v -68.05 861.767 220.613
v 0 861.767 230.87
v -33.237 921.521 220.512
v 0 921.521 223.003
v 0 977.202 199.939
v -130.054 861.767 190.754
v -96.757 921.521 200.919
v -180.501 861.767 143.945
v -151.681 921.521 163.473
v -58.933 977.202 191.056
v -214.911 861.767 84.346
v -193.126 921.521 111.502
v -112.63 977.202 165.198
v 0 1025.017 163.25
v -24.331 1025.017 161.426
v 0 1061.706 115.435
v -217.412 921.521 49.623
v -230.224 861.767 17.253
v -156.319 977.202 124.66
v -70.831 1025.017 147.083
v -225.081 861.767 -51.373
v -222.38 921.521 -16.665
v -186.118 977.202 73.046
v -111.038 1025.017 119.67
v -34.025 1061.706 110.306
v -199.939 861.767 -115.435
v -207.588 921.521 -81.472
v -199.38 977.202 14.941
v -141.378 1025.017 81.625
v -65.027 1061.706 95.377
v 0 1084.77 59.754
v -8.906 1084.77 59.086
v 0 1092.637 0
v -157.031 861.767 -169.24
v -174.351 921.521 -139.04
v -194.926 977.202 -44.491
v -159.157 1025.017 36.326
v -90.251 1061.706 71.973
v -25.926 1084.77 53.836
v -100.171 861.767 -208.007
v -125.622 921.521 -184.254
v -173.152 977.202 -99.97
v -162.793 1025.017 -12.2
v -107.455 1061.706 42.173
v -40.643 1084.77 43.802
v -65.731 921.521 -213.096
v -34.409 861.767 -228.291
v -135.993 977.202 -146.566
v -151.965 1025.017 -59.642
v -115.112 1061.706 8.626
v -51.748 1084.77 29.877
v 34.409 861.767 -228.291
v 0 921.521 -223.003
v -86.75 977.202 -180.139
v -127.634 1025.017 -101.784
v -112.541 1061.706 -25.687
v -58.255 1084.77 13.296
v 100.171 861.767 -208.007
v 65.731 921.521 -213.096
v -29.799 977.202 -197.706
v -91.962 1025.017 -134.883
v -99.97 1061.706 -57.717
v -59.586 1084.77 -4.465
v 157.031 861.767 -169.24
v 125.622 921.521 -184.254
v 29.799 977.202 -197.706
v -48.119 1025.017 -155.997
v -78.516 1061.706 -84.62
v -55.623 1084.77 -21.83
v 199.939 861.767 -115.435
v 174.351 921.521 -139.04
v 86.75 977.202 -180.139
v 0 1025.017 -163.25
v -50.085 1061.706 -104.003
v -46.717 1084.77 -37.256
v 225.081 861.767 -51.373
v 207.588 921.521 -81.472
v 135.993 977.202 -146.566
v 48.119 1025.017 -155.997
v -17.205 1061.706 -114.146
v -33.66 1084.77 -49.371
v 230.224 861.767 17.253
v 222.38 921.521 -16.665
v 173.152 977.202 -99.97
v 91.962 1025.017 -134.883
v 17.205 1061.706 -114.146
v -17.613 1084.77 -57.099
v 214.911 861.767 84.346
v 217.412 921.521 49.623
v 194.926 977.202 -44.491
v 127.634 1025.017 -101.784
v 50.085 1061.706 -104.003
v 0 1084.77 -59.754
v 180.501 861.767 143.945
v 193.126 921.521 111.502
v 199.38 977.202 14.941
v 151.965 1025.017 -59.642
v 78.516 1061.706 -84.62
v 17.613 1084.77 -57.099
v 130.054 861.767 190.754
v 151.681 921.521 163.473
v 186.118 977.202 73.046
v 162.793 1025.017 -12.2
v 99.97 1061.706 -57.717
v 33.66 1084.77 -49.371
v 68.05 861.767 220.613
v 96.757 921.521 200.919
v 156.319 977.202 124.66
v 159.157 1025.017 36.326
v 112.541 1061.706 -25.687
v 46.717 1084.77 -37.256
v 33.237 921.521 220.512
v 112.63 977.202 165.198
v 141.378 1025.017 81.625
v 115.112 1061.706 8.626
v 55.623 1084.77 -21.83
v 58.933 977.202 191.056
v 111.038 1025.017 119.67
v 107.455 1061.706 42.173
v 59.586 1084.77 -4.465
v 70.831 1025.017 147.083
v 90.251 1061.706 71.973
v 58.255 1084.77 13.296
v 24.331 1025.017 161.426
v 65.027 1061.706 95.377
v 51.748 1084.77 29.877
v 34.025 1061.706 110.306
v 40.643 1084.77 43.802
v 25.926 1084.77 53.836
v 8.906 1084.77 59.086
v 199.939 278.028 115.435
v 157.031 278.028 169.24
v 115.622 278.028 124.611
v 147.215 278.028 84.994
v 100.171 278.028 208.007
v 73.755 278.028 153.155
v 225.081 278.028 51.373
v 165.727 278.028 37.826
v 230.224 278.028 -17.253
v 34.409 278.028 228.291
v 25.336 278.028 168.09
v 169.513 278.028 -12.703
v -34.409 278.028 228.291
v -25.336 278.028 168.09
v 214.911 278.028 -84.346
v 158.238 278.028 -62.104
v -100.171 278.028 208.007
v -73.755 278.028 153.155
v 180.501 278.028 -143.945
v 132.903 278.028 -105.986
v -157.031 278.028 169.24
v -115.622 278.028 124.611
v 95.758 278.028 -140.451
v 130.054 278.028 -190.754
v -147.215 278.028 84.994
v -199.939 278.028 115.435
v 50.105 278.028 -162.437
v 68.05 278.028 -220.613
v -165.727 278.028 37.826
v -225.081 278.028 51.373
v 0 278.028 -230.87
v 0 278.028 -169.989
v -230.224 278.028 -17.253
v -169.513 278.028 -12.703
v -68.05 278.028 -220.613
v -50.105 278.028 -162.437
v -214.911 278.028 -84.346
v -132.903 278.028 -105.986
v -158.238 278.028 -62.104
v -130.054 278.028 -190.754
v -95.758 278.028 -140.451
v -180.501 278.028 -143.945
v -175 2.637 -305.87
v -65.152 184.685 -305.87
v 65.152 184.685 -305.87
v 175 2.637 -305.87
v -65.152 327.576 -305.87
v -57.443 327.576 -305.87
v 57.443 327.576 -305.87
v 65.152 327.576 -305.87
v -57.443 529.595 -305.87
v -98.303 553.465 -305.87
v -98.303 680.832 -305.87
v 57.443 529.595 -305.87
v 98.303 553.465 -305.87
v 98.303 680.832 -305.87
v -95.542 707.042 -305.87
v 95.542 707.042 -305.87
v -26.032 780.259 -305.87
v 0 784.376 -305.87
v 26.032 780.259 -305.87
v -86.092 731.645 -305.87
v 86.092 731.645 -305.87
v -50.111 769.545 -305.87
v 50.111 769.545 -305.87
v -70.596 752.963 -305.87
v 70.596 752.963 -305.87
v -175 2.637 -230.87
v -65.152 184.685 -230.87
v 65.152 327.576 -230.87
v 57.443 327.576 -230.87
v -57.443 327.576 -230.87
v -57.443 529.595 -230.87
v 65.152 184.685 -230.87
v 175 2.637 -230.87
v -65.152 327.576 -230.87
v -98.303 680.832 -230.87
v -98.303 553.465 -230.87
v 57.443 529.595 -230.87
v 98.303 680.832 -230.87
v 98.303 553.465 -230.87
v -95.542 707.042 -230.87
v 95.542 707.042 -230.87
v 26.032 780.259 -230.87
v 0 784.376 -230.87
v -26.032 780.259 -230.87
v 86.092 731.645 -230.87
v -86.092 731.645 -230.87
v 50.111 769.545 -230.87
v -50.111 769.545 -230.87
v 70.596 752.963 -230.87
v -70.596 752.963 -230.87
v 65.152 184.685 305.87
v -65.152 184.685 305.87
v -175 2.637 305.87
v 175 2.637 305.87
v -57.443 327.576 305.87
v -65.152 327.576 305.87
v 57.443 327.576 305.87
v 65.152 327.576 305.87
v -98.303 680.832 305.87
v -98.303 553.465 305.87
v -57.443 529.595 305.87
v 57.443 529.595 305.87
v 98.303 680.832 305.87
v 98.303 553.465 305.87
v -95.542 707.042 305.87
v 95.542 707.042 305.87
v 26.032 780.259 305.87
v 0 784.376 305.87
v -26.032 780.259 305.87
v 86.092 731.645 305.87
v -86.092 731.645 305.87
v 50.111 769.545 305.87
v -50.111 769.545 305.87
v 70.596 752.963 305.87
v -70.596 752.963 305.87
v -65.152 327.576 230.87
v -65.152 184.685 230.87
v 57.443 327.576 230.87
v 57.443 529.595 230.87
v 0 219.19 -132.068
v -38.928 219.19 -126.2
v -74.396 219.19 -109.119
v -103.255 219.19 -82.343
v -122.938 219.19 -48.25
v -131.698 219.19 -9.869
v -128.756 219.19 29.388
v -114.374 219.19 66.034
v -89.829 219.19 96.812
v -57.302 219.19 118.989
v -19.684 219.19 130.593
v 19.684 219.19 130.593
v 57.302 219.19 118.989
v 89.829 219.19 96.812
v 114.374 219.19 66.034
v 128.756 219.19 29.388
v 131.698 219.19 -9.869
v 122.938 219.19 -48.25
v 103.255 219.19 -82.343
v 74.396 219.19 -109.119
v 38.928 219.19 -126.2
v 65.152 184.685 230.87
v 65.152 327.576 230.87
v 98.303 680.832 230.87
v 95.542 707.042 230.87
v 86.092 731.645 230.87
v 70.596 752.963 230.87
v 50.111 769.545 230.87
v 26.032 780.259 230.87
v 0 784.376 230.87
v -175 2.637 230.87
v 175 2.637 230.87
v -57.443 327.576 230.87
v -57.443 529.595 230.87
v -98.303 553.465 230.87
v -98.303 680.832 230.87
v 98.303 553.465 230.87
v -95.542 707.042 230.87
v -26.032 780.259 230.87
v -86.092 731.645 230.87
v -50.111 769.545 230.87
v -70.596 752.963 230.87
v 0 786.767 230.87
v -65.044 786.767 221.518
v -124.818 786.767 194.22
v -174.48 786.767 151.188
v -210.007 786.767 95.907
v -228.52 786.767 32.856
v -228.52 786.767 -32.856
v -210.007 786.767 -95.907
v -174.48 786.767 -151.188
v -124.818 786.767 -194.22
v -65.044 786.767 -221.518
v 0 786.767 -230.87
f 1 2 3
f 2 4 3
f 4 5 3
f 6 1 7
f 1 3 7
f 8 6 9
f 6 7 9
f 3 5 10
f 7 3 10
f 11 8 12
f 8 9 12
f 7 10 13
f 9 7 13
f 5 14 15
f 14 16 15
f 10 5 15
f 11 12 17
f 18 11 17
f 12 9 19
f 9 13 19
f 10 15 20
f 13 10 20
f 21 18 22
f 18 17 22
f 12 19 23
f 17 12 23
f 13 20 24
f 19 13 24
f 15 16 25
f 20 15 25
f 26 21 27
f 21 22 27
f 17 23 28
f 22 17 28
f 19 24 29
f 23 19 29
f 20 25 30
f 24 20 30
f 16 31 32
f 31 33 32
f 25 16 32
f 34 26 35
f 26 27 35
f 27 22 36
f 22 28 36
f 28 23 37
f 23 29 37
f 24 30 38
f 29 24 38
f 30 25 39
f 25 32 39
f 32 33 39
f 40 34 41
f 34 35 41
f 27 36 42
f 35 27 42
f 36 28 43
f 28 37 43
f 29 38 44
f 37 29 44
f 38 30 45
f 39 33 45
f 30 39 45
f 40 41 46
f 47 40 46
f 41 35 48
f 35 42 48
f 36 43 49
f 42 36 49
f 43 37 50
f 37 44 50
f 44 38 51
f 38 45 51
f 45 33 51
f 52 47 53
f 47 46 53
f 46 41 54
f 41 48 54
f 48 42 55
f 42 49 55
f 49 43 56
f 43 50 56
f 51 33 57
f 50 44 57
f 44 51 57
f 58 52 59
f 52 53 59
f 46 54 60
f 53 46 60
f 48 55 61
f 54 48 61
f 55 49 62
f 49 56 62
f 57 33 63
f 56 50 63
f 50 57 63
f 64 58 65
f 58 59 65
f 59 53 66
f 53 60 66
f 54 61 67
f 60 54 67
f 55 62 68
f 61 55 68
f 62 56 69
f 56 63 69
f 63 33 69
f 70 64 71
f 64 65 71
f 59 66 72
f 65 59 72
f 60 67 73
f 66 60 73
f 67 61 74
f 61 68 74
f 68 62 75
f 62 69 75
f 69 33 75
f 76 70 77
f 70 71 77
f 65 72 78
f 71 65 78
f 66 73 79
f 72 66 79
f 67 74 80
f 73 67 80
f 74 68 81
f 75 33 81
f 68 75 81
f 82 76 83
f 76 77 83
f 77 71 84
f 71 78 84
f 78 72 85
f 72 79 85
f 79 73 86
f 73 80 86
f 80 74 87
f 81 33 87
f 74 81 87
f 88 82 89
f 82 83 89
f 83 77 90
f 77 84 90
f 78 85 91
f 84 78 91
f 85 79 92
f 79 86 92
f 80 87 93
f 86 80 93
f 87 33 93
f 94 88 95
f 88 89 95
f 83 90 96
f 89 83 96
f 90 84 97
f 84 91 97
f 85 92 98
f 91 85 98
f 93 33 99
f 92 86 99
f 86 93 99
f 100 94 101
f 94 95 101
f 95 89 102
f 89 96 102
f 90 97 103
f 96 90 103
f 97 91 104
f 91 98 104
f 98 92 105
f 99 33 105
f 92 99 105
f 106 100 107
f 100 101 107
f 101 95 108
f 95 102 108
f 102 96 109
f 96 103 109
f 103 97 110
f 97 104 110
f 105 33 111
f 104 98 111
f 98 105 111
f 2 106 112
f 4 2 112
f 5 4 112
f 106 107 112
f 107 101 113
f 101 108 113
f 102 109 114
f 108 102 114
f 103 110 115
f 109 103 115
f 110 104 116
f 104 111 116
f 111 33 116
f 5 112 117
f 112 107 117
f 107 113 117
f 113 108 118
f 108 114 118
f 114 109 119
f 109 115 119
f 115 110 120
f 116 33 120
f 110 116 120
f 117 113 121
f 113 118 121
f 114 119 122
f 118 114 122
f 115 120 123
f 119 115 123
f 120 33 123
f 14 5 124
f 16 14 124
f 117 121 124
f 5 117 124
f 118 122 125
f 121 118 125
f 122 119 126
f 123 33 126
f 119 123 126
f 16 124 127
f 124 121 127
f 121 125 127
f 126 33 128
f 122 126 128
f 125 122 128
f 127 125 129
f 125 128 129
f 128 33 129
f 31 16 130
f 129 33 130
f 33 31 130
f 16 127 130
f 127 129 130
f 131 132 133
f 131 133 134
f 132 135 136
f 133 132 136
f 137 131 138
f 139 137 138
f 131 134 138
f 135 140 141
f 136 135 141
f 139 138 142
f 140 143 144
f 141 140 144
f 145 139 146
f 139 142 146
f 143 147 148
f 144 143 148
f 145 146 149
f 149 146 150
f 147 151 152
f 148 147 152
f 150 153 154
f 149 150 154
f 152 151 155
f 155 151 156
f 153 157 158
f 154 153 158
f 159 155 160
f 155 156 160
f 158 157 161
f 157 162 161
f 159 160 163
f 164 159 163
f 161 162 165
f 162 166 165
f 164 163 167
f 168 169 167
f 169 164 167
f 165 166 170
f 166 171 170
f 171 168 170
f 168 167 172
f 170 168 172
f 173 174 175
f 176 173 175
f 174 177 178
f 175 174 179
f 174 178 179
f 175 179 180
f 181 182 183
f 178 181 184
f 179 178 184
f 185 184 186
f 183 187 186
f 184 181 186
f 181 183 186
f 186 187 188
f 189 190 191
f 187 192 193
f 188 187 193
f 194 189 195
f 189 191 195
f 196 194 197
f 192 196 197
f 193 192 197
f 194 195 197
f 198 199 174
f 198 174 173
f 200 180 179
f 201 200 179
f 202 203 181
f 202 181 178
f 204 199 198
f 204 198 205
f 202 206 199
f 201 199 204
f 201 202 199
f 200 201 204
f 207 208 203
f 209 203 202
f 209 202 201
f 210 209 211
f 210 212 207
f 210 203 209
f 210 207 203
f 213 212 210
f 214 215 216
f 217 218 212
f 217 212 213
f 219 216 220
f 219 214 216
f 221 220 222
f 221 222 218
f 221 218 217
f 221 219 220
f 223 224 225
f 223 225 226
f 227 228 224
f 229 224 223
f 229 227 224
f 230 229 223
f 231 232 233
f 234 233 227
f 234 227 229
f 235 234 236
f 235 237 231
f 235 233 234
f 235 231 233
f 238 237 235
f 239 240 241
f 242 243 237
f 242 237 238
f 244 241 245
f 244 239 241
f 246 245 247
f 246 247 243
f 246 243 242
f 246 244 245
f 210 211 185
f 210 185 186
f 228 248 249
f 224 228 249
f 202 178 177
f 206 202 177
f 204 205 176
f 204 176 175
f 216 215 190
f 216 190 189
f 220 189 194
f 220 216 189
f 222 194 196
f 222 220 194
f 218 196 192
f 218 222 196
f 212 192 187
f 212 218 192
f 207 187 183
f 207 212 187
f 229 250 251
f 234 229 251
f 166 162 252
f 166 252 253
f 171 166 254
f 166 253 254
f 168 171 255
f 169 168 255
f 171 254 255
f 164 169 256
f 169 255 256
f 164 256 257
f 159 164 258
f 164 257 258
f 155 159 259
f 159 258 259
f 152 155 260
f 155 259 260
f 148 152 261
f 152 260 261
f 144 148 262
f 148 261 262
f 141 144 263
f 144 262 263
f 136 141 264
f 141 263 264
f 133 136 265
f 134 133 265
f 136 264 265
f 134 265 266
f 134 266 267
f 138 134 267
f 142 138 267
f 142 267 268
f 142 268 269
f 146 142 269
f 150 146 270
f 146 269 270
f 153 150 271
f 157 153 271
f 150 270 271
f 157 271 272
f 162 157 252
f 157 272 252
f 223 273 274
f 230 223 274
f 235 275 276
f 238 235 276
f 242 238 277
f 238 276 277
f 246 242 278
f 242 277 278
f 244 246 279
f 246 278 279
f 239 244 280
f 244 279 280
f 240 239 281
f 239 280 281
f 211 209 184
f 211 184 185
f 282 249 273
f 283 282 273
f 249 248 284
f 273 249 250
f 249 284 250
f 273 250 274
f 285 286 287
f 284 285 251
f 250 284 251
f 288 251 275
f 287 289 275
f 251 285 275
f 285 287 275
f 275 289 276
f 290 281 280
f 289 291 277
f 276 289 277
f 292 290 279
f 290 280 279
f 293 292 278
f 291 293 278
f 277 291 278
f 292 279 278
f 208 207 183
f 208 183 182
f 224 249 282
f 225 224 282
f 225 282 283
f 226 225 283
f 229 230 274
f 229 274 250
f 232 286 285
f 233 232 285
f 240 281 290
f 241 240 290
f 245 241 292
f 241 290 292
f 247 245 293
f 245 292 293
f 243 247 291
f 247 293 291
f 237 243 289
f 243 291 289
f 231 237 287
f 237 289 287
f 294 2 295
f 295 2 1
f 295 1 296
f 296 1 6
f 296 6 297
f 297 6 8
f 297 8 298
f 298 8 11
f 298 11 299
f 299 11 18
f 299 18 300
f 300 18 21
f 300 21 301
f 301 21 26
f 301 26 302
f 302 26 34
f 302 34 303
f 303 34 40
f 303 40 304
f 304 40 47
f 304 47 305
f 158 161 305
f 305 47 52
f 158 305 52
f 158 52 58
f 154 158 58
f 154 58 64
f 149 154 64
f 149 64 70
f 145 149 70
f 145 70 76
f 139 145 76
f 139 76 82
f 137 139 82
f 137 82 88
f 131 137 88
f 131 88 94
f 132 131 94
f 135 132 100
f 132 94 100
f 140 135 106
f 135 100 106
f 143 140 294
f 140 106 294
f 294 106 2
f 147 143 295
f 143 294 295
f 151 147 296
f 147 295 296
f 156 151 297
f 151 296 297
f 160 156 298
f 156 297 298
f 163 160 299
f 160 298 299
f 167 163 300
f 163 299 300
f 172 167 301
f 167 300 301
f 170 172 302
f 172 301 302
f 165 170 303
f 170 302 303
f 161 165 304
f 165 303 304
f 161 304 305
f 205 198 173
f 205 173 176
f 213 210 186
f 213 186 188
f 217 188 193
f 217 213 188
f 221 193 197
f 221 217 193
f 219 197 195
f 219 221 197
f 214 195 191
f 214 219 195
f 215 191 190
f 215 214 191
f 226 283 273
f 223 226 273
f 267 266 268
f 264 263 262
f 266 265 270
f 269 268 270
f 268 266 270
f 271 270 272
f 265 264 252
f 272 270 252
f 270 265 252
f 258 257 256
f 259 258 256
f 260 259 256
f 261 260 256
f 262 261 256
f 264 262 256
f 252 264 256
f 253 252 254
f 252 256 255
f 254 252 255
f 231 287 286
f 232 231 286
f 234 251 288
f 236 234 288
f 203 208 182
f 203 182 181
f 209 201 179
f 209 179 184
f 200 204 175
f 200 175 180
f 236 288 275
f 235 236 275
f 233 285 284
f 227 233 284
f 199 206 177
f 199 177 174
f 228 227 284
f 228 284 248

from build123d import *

# Parameters (mm, degrees)
BOSS_EXTRUDE1_DEPTH = 75


with BuildPart() as part:
    # Sketch1 → Revolve1 (revolve)
    with BuildSketch(Plane(origin=(0, 0, 0), x_dir=(0, 0, -1), z_dir=(1, 0, 0))):
        Polygon((0, 786.767092044), (230.869874895, 786.767092044), (230.869874895, 278.028274446), (169.988720126, 278.028274446), (132.067656697, 219.189571635), (0, 219.189571635), align=None)
    revolve(axis=Axis((0, 219.189571635, 0), (0, 1, 0)))

    # Sketch2 → Revolve3 (revolve)
    with BuildSketch(Plane(origin=(0, 0, 0), x_dir=(0, 0, -1), z_dir=(1, 0, 0))):
        with BuildLine():
            ThreePointArc((-230.869874895, 861.767092044), (-163.24965411, 1025.016746154), (0, 1092.636966939))
            Line((0, 1092.636966939), (0, 786.767092044))
            Line((0, 786.767092044), (-230.869874895, 786.767092044))
            Line((-230.869874895, 786.767092044), (-230.869874895, 861.767092044))
        make_face()
    revolve(axis=Axis((0, 786.767092044, 0), (0, -1, 0)))


with BuildPart() as body_2:
    # Sketch7 → Boss-Extrude1 (new body)
    with BuildSketch(Plane(origin=(0, 0, -230.869874895), x_dir=(-1, 0, 0), z_dir=(0, 0, -1))):
        with BuildLine():
            Line((98.30284319, 680.831919222), (98.30284319, 553.465340718))
            Line((98.30284319, 553.465340718), (57.443091038, 529.595182603))
            Line((57.443091038, 529.595182603), (57.443091038, 327.575952081))
            Line((57.443091038, 327.575952081), (65.151727755, 327.575952081))
            Line((65.151727755, 327.575952081), (65.151727755, 184.684592199))
            Line((65.151727755, 184.684592199), (175, 2.636966939))
            Line((175, 2.636966939), (-175, 2.636966939))
            Line((-175, 2.636966939), (-65.151727755, 184.684592199))
            Line((-65.151727755, 184.684592199), (-65.151727755, 327.575952081))
            Line((-65.151727755, 327.575952081), (-57.443091038, 327.575952081))
            Line((-57.443091038, 327.575952081), (-57.443091038, 529.595182603))
            Line((-57.443091038, 529.595182603), (-98.30284319, 553.465340718))
            Line((-98.30284319, 553.465340718), (-98.30284319, 680.831919222))
            ThreePointArc((-98.30284319, 680.831919222), (-70.596182709, 752.96333778), (0, 784.376385469))
            ThreePointArc((0, 784.376385469), (70.596182709, 752.96333778), (98.30284319, 680.831919222))
        make_face()
    extrude(amount=BOSS_EXTRUDE1_DEPTH)


with BuildPart() as body_3:
    # Mirror18: mirrored copy
    add(body_2.part.mirror(Plane.XY))


solid = Compound([part.part, body_2.part, body_3.part])
